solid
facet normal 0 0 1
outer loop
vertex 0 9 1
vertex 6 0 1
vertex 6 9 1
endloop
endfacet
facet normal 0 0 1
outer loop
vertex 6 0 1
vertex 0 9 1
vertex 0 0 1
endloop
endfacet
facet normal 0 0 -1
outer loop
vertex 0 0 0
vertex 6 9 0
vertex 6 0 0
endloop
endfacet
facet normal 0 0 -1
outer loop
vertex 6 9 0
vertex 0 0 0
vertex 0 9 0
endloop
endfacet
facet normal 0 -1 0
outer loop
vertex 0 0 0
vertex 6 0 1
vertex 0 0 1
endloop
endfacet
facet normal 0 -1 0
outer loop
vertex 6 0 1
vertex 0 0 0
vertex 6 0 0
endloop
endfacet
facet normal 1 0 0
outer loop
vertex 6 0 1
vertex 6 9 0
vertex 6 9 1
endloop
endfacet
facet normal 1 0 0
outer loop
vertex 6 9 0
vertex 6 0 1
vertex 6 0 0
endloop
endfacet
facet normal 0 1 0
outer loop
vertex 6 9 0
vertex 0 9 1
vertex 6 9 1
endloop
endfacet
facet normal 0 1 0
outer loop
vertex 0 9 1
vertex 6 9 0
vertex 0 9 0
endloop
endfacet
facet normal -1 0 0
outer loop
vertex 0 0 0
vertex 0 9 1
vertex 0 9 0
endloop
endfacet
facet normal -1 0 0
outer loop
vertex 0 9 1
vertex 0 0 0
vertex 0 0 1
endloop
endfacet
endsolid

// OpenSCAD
var1=3+3;// 6
var2=3-3;// 0
var3=3*3;// 9
var4=3/3;// 1
var5=(var3+var4)%(var1+var2);
echo(var5);
cube([var1,var3,var4]);
